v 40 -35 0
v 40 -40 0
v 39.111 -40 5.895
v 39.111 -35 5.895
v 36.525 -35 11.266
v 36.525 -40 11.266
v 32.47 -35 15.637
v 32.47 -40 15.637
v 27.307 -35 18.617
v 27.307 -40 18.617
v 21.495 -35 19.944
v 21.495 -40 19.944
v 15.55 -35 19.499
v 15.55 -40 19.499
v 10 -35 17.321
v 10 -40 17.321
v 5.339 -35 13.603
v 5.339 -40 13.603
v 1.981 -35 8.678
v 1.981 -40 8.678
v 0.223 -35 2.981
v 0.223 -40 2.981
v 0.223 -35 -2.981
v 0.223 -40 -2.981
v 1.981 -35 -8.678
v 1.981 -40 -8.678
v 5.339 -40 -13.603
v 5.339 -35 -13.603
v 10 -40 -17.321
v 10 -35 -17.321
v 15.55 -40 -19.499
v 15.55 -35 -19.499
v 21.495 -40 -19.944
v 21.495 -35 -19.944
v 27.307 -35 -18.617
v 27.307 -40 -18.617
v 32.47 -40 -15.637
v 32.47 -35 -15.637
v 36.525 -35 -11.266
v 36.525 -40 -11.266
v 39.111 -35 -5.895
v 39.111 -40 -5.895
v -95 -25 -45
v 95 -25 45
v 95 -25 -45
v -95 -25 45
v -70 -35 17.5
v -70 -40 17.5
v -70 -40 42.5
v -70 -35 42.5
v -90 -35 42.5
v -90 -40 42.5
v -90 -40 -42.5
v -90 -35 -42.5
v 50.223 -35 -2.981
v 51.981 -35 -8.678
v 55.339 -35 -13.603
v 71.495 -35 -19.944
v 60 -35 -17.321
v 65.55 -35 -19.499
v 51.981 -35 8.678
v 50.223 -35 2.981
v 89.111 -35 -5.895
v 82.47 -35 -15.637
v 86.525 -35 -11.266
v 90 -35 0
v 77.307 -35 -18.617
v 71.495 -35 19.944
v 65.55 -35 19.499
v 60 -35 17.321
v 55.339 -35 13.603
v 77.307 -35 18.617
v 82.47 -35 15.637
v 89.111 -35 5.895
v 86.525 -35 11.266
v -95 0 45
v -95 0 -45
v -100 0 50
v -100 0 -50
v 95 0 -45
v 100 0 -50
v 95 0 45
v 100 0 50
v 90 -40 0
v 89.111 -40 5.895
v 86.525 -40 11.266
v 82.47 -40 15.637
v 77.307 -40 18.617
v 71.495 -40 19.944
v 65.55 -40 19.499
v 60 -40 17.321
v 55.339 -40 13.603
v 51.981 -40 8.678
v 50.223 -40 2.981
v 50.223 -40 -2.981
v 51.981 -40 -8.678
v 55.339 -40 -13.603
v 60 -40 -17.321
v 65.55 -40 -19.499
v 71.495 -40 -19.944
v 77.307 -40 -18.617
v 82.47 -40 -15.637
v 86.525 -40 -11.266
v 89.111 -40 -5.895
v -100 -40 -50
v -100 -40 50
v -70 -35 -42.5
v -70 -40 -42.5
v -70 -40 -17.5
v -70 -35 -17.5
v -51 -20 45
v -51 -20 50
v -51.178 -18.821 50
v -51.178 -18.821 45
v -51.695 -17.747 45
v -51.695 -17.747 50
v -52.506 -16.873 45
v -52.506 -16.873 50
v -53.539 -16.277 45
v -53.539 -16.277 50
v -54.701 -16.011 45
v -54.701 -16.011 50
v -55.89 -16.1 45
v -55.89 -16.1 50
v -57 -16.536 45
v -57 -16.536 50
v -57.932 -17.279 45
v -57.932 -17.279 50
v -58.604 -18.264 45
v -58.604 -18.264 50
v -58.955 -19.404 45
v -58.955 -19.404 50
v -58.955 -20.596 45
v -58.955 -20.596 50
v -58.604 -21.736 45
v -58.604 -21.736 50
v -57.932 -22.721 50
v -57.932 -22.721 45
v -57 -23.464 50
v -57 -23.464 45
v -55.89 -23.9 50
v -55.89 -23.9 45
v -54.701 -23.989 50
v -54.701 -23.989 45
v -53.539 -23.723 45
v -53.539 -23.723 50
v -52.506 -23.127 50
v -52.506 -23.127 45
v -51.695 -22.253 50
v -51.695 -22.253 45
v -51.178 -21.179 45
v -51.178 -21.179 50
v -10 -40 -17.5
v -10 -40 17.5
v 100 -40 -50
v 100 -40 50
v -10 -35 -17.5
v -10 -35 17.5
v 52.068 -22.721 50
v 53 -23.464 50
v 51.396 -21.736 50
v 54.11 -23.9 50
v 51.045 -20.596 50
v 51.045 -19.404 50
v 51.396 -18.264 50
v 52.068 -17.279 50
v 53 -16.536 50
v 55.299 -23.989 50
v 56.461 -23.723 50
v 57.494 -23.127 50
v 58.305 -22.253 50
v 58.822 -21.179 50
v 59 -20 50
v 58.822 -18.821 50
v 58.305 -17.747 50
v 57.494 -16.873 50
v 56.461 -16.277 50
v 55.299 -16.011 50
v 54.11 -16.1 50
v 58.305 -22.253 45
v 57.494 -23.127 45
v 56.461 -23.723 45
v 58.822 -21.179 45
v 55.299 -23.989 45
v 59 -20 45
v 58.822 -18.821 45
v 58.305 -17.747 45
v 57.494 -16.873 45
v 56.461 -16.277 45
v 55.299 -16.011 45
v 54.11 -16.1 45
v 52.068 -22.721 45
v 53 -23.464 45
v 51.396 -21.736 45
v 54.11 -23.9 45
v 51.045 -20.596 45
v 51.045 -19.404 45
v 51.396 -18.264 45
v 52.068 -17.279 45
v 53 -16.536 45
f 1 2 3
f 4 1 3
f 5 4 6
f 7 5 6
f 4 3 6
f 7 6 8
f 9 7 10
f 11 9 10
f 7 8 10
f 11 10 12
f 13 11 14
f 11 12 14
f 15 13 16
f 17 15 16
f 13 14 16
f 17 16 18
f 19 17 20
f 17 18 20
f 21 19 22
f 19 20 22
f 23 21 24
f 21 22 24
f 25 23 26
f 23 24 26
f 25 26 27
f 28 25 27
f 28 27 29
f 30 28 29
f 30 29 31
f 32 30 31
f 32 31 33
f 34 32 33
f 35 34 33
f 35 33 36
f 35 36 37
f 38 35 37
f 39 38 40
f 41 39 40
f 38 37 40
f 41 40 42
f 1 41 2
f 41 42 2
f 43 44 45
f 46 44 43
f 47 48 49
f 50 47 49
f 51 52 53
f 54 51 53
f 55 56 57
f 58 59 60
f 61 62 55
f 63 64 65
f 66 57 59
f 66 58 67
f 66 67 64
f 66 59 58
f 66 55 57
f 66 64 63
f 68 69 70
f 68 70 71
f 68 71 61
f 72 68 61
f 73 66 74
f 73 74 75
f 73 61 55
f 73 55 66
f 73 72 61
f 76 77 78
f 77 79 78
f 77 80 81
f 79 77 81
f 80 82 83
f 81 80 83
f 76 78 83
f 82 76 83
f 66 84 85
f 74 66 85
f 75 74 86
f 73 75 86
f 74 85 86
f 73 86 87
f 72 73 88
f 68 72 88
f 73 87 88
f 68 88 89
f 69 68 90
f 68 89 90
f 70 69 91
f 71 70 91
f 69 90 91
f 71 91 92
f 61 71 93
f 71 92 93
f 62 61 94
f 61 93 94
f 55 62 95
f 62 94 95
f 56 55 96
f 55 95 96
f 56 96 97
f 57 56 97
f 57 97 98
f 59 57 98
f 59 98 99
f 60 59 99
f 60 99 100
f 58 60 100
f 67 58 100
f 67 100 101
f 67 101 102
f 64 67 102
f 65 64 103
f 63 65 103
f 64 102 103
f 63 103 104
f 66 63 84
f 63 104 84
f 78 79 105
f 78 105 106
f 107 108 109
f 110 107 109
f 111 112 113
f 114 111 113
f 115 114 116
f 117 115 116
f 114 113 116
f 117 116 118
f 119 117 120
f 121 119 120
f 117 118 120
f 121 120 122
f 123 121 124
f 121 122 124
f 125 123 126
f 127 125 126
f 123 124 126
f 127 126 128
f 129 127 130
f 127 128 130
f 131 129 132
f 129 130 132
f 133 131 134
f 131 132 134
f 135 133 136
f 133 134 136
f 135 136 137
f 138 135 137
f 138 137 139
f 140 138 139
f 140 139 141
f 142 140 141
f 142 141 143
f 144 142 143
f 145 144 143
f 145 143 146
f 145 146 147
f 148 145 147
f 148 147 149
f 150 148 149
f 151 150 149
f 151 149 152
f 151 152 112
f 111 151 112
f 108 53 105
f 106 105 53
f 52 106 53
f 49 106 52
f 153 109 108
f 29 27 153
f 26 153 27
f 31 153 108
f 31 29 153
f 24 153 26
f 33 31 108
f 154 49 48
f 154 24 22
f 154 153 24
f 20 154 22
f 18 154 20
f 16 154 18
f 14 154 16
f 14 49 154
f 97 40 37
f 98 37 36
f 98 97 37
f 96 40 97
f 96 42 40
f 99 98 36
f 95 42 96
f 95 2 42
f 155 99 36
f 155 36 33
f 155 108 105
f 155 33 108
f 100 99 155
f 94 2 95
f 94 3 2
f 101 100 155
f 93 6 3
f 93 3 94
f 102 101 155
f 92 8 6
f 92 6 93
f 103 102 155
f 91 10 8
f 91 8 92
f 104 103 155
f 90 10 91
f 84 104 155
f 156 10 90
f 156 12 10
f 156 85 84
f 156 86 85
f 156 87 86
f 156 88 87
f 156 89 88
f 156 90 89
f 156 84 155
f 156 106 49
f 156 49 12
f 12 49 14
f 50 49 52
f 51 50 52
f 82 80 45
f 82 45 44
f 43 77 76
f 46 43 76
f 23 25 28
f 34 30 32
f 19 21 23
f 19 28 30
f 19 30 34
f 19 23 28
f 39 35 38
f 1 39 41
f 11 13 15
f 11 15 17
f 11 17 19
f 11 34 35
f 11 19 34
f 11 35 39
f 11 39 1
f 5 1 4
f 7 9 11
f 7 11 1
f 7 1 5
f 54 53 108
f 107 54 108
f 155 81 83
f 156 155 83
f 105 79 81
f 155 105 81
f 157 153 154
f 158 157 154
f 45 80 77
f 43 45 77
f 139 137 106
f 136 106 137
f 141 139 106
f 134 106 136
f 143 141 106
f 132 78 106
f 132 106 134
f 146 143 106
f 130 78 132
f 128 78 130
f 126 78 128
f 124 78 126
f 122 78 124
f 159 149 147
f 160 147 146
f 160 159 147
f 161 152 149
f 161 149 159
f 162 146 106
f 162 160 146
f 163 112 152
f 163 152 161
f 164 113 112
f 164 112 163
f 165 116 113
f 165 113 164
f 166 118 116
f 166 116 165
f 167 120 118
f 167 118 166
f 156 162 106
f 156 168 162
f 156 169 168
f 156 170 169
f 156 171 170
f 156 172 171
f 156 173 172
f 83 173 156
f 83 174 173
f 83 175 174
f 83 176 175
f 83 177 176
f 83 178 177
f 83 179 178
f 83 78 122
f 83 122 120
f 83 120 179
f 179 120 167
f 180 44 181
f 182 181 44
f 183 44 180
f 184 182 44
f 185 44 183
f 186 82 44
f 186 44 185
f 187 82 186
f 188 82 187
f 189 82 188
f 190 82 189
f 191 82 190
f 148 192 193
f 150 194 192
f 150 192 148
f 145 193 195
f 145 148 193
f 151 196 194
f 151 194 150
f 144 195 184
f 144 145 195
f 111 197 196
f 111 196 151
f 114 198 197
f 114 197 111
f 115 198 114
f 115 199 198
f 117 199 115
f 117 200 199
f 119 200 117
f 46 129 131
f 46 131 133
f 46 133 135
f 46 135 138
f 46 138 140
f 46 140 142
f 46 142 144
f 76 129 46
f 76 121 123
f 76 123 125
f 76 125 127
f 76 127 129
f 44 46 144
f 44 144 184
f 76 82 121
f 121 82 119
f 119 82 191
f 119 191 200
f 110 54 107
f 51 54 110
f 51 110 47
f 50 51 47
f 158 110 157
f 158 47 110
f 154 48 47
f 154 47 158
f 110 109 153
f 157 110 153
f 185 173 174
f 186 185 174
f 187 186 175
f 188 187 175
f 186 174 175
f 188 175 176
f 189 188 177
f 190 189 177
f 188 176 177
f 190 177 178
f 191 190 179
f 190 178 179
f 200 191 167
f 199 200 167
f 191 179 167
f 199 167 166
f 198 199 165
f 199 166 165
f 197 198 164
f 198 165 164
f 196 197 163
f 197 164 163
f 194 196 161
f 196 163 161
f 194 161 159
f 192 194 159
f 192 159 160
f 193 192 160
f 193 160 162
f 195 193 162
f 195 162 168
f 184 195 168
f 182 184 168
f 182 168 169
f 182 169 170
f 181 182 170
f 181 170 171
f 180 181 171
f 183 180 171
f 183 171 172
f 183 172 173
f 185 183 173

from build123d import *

# Parameters (mm, degrees)
F0_W     = 200
F0_H     = 100
F1_DEPTH = 40
F2_W     = 60
F2_H     = 35
F2_R     = 20
F3_DEPTH = 5
F4_W     = 190
F4_H     = 90
F5_DEPTH = 25
F6_R     = 4
F7_DEPTH = 40


with BuildPart() as f1:
    # F0 (on Front) → F1 (new body)
    with BuildSketch(Plane.XZ):
        Rectangle(F0_W, F0_H)
    extrude(amount=F1_DEPTH)

    # F2 (on face) → F3 (cut)
    with BuildSketch(Plane.XZ.offset(40)):
        Polygon((-90, -42.5), (-70, -42.5), (-70, -17.5), (-70, 17.5), (-70, 42.5), (-90, 42.5), align=None)
        with Locations((-40, 0)):
            Rectangle(F2_W, F2_H)
        with Locations((20, 0)):
            Circle(F2_R)
        with Locations((70, 0)):
            Circle(F2_R)
    extrude(amount=-F3_DEPTH, mode=Mode.SUBTRACT)

    # F4 (on face) → F5 (cut)
    with BuildSketch(Plane(origin=(0, 0, 0), x_dir=(-1, 0, 0), z_dir=(0, 1, 0))):
        Rectangle(F4_W, F4_H)
    extrude(amount=-F5_DEPTH, mode=Mode.SUBTRACT)

    # F6 (on face) → F7 (cut)
    with BuildSketch(Plane.XY.offset(50)):
        with Locations((-55, -20)):
            Circle(F6_R)
        with Locations((55, -20)):
            Circle(F6_R)
    extrude(amount=-F7_DEPTH, mode=Mode.SUBTRACT)


solid = f1.part
